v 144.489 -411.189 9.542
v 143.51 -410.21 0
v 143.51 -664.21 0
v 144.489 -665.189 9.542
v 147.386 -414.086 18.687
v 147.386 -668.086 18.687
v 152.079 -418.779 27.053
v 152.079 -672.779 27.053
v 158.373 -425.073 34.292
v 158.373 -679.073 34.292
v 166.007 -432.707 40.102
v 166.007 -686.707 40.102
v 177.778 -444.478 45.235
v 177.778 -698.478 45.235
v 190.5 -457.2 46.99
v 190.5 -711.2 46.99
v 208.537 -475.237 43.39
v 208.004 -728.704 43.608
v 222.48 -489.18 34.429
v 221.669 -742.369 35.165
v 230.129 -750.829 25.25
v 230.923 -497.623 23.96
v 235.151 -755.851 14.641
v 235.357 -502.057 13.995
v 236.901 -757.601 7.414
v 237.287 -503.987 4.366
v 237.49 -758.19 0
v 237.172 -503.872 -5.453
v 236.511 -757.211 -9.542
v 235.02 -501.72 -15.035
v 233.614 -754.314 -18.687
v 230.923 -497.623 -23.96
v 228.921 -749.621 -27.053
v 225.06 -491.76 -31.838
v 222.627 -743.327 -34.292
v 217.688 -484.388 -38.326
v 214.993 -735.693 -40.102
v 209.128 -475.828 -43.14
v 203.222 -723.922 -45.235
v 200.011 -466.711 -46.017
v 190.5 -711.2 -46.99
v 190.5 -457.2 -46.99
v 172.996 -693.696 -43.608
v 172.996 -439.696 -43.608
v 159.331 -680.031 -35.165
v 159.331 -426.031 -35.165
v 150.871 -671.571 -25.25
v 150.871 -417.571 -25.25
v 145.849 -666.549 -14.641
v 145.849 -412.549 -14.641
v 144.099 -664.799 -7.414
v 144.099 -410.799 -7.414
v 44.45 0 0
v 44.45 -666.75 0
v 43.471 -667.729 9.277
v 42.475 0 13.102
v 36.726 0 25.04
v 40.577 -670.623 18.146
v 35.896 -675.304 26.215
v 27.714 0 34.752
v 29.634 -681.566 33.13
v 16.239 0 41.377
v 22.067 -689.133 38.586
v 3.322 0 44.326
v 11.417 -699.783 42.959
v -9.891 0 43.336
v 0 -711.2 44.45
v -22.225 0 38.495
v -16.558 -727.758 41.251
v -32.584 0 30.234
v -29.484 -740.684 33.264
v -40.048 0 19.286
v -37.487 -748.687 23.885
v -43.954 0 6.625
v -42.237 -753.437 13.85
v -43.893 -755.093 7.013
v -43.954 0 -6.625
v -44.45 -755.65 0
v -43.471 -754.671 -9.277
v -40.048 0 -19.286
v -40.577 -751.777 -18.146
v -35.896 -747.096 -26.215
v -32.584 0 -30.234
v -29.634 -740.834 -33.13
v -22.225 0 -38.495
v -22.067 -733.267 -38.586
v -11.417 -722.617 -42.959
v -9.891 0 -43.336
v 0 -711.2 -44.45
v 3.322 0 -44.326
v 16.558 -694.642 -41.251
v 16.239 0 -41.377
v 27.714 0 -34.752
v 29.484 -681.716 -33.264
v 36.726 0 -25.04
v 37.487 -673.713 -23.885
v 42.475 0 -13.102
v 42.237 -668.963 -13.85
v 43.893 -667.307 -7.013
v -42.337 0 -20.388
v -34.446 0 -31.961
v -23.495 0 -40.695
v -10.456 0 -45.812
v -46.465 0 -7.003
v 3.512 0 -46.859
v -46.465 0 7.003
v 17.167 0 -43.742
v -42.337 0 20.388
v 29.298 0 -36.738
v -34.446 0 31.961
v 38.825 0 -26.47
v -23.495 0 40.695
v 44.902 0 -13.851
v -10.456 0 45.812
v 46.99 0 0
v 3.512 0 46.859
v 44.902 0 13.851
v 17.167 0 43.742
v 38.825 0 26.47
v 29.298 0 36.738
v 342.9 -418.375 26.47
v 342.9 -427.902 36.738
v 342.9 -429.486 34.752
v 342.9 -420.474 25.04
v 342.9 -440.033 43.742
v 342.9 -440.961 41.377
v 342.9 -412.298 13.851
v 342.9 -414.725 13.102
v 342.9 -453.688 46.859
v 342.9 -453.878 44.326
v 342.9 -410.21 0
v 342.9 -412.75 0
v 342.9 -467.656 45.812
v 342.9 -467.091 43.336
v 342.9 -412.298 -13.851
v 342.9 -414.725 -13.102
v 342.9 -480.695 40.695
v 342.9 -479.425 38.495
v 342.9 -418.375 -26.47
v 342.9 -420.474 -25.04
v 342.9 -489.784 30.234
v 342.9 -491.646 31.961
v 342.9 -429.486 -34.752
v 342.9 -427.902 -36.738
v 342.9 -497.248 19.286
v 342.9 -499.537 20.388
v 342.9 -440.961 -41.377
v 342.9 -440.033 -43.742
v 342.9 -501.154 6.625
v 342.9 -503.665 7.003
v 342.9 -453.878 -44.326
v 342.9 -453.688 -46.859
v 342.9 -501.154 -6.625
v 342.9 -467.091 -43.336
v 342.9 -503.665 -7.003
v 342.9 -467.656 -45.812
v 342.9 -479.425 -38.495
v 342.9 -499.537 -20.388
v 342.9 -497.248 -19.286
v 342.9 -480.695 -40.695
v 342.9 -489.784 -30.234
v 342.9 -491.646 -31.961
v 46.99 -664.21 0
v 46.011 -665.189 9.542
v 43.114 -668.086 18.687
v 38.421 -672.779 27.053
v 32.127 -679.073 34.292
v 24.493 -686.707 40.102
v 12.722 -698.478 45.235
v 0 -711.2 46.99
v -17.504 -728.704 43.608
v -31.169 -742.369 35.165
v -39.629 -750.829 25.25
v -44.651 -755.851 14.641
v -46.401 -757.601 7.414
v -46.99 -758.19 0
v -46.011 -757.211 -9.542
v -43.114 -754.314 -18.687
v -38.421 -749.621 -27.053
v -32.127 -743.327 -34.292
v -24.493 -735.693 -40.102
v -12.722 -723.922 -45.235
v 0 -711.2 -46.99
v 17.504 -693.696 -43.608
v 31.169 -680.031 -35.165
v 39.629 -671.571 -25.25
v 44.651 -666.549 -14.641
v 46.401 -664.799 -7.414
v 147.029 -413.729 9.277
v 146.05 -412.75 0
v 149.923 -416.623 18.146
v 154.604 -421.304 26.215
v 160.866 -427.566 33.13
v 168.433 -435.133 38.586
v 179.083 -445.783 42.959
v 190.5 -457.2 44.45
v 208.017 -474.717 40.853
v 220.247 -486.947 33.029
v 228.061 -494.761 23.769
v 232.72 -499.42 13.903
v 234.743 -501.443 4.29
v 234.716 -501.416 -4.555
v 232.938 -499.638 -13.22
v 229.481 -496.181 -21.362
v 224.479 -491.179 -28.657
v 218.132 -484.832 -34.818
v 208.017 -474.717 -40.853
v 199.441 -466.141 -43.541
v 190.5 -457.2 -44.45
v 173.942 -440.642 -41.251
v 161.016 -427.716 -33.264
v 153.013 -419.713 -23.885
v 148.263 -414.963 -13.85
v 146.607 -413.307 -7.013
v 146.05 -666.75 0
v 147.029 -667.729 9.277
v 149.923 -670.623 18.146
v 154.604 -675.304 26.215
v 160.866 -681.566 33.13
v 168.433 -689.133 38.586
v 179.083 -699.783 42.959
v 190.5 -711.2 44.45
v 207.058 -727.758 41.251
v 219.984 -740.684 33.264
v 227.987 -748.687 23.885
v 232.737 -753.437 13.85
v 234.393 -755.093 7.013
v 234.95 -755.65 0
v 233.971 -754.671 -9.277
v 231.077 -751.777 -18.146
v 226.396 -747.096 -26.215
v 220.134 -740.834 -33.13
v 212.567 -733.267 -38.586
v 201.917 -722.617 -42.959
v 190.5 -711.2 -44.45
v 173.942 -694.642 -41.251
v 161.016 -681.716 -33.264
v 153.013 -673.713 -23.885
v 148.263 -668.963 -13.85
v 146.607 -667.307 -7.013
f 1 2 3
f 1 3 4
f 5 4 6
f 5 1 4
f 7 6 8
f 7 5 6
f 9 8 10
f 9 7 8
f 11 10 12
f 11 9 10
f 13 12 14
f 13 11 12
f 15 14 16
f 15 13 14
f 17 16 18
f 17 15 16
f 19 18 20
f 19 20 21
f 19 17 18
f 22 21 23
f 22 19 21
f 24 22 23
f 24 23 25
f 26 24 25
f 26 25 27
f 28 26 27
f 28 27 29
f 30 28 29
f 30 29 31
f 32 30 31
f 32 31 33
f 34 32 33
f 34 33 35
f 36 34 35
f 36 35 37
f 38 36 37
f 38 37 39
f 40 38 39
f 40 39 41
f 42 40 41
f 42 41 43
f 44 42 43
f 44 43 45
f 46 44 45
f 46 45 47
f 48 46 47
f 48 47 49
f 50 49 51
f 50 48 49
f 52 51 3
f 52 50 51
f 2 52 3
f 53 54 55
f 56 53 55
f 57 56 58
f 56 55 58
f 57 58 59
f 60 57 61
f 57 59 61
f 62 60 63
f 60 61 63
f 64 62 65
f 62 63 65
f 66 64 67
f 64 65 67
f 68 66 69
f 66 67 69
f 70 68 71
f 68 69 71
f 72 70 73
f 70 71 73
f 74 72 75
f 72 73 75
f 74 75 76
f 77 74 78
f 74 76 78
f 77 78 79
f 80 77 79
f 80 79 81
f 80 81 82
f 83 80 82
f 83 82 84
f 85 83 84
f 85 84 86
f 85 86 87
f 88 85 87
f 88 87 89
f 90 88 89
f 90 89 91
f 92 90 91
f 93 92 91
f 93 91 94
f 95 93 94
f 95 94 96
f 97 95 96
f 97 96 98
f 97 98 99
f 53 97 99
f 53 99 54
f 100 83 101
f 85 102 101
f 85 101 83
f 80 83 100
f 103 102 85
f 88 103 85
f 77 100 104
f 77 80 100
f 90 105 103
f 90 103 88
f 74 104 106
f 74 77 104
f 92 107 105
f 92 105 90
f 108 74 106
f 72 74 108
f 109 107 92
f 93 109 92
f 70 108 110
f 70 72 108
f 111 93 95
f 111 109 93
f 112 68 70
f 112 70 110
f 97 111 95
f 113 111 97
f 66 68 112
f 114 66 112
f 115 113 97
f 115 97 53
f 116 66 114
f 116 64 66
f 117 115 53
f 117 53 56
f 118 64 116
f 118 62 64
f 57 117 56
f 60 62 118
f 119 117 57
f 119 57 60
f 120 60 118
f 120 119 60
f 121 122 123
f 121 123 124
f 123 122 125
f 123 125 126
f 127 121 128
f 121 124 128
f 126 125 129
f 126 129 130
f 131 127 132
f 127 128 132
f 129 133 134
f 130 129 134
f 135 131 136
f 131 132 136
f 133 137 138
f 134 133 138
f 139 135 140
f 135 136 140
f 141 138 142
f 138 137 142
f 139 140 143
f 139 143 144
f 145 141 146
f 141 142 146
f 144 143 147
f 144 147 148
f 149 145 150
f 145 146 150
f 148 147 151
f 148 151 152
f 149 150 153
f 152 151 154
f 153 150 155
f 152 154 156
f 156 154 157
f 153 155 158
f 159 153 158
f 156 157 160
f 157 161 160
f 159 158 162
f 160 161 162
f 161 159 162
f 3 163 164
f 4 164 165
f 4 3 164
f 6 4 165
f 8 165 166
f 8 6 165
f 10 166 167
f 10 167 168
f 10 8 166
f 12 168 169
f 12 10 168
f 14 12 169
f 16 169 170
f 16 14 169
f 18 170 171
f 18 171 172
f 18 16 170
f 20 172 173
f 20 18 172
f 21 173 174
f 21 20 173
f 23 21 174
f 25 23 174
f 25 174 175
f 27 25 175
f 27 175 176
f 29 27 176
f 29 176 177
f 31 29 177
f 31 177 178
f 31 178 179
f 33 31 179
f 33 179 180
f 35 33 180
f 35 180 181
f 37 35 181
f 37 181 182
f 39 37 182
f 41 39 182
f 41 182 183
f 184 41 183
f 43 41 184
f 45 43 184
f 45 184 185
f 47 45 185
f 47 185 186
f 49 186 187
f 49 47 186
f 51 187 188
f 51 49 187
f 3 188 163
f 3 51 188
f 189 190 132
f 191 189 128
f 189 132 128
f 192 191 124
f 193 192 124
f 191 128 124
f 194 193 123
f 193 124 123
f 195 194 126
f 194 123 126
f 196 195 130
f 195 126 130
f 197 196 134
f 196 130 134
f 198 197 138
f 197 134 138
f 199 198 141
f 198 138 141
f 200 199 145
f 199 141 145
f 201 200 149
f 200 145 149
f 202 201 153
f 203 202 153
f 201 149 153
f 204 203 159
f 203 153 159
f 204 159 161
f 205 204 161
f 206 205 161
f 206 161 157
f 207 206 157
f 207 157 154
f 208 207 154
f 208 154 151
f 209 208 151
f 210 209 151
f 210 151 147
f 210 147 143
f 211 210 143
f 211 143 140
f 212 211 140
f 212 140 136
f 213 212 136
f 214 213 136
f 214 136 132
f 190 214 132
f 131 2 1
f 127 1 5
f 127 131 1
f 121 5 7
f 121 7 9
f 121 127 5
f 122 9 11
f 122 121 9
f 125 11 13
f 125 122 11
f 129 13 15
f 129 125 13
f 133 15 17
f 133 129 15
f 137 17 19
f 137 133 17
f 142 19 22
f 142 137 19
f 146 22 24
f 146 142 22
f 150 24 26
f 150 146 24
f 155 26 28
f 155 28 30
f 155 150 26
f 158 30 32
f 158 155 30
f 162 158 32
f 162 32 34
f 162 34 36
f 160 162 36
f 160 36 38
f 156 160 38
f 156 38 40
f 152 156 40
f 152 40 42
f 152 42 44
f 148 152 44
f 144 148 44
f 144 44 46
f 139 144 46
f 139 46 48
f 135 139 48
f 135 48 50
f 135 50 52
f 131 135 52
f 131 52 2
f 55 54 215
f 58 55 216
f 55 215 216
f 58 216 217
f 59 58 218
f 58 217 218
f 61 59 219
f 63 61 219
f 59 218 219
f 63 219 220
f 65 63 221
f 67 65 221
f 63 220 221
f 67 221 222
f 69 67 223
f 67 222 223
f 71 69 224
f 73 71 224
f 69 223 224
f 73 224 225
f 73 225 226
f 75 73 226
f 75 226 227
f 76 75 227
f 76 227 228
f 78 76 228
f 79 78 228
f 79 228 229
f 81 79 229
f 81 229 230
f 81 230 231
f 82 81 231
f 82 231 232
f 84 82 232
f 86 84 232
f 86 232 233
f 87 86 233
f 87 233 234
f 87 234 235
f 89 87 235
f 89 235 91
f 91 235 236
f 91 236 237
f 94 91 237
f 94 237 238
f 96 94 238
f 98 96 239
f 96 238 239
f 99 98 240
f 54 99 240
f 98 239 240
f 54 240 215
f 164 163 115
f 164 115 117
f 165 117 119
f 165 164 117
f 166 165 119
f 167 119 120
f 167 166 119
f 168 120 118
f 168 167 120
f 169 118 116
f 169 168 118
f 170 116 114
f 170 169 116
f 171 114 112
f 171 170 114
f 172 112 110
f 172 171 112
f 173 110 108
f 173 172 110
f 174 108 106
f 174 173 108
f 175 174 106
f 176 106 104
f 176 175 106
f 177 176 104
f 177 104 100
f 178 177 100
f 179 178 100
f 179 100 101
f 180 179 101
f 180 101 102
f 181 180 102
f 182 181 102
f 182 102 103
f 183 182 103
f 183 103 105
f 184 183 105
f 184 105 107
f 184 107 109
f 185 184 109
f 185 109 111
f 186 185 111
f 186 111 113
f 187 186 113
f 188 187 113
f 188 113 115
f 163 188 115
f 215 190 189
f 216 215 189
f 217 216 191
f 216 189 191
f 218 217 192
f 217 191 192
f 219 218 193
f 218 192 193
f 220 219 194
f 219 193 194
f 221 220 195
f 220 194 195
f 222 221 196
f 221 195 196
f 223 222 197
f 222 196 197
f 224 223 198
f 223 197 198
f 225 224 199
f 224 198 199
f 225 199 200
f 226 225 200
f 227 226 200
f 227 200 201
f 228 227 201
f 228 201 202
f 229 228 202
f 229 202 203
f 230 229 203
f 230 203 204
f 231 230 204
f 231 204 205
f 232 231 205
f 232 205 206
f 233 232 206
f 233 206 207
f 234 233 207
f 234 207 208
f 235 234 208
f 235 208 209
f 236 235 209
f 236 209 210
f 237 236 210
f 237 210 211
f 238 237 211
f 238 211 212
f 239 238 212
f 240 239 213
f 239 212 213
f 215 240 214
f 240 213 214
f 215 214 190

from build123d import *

# Parameters (mm, degrees)
SKETCH1_R   = 46.99
SKETCH1_R_2 = 44.45


with BuildPart() as part:
    # Sweep2: sweep along a curve in space
    with BuildLine() as sweep2_path:
        Line((0, 0, 0), (0, -711.2, 0))
        Line((0, -711.2, 0), (190.5, -711.2, 0))
        Line((190.5, -711.2, 0), (190.5, -457.2, 0))
        Line((190.5, -457.2, 0), (342.9, -457.2, 0))
    # Sketch1 → Sweep2 (sweep)
    with BuildSketch(Plane(origin=(0, 0, 0), x_dir=(1, 0, 0), z_dir=(0, 1, 0))):
        Circle(SKETCH1_R)
        Circle(SKETCH1_R_2, mode=Mode.SUBTRACT)
    sweep(path=sweep2_path.line, transition=Transition.RIGHT)


solid = part.part
